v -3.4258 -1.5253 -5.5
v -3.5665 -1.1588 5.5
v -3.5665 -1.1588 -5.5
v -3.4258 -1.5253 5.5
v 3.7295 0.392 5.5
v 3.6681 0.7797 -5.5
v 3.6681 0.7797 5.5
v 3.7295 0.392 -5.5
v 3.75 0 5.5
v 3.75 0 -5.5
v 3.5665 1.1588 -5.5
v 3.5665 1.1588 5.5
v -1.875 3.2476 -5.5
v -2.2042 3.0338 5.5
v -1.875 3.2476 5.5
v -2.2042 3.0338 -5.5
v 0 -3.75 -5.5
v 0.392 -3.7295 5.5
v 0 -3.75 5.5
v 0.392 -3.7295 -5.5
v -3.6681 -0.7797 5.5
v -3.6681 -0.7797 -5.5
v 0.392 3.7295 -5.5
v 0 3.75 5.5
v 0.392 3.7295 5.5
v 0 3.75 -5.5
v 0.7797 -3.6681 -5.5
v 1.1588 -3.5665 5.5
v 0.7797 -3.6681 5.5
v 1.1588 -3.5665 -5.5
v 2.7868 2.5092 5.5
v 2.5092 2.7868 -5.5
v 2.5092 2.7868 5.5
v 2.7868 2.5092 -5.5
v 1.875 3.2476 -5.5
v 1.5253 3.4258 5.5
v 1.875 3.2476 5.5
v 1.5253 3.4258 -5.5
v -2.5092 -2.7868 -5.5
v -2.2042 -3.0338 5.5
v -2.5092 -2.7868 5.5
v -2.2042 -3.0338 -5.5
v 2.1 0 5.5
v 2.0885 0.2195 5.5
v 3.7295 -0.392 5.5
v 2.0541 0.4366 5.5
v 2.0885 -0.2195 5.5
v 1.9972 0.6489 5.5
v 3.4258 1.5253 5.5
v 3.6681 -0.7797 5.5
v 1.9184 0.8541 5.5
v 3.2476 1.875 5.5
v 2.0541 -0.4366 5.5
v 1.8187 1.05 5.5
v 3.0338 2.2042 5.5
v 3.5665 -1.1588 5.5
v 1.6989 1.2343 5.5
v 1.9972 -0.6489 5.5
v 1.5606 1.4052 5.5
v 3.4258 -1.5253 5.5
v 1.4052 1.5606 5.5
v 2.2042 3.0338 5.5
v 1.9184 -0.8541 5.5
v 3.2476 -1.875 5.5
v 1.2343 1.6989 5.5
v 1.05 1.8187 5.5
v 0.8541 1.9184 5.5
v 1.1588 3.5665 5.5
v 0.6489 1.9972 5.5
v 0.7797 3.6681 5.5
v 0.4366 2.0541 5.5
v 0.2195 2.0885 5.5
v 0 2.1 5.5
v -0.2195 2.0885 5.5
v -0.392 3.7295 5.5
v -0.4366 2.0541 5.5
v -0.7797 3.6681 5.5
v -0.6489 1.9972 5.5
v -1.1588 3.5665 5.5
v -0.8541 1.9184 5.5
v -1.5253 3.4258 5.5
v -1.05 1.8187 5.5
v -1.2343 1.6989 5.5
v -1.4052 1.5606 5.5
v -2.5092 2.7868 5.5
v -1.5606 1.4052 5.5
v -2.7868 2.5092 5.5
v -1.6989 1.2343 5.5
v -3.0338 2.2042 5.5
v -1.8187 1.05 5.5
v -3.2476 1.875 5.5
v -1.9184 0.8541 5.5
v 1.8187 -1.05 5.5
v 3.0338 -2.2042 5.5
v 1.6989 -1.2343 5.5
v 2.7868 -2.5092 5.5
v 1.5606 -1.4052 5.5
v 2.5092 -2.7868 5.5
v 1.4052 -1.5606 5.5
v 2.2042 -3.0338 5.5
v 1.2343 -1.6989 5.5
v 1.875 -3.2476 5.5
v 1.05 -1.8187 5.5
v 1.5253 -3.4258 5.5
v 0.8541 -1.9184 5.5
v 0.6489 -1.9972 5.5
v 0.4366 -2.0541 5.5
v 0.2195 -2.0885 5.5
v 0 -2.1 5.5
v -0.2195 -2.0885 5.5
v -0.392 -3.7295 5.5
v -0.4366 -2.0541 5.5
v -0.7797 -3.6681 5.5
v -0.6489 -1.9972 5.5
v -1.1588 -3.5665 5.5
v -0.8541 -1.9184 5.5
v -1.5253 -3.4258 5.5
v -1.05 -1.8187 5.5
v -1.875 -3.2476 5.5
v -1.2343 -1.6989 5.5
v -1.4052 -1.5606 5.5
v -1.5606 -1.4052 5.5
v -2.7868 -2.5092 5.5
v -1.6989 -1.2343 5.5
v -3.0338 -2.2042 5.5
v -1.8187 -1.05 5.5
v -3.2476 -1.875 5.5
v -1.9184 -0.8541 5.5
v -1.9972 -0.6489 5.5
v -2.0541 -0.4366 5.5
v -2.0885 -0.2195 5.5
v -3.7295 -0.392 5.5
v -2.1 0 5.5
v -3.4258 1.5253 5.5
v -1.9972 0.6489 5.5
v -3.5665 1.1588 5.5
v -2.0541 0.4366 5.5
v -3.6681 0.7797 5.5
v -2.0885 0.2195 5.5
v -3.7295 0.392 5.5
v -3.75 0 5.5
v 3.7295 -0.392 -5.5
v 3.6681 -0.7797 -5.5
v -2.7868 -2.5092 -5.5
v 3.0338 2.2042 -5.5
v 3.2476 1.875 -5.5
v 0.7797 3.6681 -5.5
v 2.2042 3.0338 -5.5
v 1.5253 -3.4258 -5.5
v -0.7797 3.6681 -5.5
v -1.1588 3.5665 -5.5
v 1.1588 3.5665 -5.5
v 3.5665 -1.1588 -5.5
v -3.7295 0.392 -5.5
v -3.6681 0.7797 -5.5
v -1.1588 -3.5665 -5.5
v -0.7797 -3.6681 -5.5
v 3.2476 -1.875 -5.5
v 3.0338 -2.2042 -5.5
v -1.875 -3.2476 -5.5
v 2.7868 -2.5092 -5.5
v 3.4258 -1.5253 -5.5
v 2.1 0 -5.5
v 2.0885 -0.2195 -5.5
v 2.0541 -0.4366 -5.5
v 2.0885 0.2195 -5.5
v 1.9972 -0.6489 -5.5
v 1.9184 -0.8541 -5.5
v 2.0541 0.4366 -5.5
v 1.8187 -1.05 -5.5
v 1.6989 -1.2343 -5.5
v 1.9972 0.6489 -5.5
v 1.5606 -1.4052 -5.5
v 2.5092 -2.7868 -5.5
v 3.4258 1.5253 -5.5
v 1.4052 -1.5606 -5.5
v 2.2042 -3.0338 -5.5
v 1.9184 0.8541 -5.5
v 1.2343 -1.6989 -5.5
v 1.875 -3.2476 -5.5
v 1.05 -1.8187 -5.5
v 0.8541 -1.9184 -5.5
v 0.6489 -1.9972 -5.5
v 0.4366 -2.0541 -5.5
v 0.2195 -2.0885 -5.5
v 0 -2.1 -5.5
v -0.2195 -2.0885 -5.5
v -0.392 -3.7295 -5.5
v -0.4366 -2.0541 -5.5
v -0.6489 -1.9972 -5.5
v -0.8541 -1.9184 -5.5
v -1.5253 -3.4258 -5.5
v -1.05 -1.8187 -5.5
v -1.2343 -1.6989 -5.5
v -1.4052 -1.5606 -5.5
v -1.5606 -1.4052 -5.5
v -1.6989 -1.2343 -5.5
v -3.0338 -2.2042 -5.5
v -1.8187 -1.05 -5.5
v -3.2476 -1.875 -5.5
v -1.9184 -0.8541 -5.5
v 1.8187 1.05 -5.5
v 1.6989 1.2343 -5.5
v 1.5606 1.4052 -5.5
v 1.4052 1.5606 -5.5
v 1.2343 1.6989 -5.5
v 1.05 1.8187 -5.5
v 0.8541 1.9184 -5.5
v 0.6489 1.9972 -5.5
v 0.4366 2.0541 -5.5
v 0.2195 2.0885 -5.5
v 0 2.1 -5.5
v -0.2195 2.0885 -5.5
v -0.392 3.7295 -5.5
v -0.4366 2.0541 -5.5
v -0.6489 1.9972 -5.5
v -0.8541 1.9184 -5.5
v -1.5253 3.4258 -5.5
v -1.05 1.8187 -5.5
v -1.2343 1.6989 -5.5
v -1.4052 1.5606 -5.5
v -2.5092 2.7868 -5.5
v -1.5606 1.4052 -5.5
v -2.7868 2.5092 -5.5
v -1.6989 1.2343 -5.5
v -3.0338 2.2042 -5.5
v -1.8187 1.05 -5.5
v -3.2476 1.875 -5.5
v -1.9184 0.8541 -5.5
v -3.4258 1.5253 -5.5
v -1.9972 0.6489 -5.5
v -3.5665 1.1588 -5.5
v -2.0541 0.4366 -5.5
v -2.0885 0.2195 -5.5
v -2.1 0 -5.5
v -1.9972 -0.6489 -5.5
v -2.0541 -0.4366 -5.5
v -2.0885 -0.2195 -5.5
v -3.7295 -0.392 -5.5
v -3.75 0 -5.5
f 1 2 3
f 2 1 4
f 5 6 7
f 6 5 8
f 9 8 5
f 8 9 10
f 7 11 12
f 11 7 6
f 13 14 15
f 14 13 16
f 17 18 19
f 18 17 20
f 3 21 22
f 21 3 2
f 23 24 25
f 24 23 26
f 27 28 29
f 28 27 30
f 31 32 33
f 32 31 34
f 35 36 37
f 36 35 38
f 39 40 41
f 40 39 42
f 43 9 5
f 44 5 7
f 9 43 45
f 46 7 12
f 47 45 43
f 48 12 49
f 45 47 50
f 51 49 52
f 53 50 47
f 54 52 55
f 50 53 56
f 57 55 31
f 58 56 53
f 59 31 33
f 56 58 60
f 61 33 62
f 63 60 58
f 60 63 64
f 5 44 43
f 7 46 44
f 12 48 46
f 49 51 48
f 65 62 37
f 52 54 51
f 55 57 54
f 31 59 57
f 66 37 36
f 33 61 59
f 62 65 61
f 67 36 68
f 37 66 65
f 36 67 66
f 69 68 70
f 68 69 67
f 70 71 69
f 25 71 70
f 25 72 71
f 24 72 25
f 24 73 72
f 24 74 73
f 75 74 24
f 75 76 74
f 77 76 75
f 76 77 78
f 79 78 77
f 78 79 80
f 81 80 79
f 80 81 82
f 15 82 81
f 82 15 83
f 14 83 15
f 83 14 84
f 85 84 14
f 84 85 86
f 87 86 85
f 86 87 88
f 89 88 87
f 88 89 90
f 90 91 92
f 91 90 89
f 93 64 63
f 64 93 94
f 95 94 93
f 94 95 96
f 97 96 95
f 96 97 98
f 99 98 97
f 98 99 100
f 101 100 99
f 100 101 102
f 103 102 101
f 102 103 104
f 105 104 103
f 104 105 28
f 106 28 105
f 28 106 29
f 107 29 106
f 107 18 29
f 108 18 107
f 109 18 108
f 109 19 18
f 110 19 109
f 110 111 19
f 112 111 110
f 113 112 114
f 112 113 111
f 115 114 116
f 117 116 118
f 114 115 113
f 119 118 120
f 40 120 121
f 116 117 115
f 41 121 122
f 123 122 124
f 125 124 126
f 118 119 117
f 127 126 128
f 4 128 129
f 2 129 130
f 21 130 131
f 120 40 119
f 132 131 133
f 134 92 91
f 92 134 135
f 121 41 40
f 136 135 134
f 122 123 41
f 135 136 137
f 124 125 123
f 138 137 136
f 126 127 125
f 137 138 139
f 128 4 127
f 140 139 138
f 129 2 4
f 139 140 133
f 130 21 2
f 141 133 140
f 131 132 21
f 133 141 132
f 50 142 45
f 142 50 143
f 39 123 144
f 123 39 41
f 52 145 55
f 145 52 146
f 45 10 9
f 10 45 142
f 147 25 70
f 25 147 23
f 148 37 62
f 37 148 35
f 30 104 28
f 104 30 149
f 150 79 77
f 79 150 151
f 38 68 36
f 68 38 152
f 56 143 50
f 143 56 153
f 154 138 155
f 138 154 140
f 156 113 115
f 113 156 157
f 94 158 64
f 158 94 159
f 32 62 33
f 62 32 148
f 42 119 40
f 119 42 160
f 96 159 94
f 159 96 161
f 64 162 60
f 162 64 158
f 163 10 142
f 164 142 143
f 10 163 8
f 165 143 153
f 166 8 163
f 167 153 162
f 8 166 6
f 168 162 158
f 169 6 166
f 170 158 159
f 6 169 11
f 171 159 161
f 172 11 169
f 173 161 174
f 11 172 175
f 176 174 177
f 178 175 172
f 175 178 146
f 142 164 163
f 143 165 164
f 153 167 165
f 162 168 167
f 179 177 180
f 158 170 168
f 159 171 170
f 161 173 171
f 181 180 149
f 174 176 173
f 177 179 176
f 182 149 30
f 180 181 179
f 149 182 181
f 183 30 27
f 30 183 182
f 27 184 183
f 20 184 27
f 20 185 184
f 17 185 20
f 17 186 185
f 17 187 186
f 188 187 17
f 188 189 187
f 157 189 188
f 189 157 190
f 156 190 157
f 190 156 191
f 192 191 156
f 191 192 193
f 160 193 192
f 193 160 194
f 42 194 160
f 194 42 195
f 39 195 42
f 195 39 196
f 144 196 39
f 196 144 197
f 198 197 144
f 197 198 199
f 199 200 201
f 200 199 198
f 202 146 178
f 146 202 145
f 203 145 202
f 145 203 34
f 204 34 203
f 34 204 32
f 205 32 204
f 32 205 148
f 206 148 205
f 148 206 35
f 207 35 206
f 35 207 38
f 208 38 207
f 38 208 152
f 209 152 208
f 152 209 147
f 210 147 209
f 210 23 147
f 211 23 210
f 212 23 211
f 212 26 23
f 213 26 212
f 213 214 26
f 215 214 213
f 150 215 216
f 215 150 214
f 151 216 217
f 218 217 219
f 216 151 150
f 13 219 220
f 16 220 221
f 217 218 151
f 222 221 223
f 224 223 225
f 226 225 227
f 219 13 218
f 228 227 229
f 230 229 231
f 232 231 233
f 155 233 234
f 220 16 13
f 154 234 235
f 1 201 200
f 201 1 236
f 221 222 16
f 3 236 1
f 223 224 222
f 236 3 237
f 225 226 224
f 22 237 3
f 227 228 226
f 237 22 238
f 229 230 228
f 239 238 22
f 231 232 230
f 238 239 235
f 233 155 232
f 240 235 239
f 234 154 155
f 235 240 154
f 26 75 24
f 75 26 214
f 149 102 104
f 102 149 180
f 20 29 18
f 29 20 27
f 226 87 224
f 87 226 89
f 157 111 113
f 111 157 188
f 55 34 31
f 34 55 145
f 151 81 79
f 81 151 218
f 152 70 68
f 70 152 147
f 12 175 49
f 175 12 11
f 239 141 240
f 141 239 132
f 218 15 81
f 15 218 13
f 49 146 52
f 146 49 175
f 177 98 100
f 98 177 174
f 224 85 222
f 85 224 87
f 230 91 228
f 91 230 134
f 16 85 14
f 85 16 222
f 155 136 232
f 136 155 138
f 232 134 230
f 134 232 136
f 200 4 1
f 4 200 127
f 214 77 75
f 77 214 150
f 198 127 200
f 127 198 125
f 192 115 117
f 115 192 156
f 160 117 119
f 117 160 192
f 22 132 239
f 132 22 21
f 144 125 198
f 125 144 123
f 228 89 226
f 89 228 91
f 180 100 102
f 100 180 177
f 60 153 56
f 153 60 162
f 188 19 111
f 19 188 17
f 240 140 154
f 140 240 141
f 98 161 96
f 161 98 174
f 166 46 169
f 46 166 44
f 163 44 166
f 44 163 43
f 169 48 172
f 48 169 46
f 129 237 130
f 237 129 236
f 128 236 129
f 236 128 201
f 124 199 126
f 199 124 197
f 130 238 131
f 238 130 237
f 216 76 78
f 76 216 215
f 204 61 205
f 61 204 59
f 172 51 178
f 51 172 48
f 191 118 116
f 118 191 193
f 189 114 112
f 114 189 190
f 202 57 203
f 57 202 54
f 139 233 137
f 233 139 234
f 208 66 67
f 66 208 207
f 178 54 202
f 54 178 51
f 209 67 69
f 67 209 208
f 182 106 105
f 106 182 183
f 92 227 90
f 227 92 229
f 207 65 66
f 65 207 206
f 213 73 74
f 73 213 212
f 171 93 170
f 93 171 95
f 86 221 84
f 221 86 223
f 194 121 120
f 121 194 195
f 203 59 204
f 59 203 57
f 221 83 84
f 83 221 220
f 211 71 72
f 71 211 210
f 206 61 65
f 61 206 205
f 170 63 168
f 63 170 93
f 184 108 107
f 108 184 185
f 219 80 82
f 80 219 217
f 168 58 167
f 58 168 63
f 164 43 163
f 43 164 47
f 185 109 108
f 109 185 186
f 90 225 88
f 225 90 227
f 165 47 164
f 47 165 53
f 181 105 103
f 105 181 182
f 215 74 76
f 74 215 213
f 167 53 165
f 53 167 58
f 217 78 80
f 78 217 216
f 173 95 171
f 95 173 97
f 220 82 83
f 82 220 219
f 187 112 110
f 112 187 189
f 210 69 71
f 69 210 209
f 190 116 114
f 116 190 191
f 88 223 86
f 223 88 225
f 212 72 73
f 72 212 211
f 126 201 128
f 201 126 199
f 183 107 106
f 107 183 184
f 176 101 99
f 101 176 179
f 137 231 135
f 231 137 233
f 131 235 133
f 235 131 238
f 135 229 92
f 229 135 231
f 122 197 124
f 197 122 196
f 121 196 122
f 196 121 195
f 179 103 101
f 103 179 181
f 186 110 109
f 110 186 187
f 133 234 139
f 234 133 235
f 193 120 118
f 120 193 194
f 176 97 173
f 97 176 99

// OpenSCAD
$fn=60;
RAD=7.5/2;
HOLE_RAD=4.2/2;

module standoff(leng){
    difference(){
        cylinder(h=leng,r=RAD,center=true);
        cylinder(h=leng*1.1,r=HOLE_RAD,center=true);
    }
}

standoff(11.0);
